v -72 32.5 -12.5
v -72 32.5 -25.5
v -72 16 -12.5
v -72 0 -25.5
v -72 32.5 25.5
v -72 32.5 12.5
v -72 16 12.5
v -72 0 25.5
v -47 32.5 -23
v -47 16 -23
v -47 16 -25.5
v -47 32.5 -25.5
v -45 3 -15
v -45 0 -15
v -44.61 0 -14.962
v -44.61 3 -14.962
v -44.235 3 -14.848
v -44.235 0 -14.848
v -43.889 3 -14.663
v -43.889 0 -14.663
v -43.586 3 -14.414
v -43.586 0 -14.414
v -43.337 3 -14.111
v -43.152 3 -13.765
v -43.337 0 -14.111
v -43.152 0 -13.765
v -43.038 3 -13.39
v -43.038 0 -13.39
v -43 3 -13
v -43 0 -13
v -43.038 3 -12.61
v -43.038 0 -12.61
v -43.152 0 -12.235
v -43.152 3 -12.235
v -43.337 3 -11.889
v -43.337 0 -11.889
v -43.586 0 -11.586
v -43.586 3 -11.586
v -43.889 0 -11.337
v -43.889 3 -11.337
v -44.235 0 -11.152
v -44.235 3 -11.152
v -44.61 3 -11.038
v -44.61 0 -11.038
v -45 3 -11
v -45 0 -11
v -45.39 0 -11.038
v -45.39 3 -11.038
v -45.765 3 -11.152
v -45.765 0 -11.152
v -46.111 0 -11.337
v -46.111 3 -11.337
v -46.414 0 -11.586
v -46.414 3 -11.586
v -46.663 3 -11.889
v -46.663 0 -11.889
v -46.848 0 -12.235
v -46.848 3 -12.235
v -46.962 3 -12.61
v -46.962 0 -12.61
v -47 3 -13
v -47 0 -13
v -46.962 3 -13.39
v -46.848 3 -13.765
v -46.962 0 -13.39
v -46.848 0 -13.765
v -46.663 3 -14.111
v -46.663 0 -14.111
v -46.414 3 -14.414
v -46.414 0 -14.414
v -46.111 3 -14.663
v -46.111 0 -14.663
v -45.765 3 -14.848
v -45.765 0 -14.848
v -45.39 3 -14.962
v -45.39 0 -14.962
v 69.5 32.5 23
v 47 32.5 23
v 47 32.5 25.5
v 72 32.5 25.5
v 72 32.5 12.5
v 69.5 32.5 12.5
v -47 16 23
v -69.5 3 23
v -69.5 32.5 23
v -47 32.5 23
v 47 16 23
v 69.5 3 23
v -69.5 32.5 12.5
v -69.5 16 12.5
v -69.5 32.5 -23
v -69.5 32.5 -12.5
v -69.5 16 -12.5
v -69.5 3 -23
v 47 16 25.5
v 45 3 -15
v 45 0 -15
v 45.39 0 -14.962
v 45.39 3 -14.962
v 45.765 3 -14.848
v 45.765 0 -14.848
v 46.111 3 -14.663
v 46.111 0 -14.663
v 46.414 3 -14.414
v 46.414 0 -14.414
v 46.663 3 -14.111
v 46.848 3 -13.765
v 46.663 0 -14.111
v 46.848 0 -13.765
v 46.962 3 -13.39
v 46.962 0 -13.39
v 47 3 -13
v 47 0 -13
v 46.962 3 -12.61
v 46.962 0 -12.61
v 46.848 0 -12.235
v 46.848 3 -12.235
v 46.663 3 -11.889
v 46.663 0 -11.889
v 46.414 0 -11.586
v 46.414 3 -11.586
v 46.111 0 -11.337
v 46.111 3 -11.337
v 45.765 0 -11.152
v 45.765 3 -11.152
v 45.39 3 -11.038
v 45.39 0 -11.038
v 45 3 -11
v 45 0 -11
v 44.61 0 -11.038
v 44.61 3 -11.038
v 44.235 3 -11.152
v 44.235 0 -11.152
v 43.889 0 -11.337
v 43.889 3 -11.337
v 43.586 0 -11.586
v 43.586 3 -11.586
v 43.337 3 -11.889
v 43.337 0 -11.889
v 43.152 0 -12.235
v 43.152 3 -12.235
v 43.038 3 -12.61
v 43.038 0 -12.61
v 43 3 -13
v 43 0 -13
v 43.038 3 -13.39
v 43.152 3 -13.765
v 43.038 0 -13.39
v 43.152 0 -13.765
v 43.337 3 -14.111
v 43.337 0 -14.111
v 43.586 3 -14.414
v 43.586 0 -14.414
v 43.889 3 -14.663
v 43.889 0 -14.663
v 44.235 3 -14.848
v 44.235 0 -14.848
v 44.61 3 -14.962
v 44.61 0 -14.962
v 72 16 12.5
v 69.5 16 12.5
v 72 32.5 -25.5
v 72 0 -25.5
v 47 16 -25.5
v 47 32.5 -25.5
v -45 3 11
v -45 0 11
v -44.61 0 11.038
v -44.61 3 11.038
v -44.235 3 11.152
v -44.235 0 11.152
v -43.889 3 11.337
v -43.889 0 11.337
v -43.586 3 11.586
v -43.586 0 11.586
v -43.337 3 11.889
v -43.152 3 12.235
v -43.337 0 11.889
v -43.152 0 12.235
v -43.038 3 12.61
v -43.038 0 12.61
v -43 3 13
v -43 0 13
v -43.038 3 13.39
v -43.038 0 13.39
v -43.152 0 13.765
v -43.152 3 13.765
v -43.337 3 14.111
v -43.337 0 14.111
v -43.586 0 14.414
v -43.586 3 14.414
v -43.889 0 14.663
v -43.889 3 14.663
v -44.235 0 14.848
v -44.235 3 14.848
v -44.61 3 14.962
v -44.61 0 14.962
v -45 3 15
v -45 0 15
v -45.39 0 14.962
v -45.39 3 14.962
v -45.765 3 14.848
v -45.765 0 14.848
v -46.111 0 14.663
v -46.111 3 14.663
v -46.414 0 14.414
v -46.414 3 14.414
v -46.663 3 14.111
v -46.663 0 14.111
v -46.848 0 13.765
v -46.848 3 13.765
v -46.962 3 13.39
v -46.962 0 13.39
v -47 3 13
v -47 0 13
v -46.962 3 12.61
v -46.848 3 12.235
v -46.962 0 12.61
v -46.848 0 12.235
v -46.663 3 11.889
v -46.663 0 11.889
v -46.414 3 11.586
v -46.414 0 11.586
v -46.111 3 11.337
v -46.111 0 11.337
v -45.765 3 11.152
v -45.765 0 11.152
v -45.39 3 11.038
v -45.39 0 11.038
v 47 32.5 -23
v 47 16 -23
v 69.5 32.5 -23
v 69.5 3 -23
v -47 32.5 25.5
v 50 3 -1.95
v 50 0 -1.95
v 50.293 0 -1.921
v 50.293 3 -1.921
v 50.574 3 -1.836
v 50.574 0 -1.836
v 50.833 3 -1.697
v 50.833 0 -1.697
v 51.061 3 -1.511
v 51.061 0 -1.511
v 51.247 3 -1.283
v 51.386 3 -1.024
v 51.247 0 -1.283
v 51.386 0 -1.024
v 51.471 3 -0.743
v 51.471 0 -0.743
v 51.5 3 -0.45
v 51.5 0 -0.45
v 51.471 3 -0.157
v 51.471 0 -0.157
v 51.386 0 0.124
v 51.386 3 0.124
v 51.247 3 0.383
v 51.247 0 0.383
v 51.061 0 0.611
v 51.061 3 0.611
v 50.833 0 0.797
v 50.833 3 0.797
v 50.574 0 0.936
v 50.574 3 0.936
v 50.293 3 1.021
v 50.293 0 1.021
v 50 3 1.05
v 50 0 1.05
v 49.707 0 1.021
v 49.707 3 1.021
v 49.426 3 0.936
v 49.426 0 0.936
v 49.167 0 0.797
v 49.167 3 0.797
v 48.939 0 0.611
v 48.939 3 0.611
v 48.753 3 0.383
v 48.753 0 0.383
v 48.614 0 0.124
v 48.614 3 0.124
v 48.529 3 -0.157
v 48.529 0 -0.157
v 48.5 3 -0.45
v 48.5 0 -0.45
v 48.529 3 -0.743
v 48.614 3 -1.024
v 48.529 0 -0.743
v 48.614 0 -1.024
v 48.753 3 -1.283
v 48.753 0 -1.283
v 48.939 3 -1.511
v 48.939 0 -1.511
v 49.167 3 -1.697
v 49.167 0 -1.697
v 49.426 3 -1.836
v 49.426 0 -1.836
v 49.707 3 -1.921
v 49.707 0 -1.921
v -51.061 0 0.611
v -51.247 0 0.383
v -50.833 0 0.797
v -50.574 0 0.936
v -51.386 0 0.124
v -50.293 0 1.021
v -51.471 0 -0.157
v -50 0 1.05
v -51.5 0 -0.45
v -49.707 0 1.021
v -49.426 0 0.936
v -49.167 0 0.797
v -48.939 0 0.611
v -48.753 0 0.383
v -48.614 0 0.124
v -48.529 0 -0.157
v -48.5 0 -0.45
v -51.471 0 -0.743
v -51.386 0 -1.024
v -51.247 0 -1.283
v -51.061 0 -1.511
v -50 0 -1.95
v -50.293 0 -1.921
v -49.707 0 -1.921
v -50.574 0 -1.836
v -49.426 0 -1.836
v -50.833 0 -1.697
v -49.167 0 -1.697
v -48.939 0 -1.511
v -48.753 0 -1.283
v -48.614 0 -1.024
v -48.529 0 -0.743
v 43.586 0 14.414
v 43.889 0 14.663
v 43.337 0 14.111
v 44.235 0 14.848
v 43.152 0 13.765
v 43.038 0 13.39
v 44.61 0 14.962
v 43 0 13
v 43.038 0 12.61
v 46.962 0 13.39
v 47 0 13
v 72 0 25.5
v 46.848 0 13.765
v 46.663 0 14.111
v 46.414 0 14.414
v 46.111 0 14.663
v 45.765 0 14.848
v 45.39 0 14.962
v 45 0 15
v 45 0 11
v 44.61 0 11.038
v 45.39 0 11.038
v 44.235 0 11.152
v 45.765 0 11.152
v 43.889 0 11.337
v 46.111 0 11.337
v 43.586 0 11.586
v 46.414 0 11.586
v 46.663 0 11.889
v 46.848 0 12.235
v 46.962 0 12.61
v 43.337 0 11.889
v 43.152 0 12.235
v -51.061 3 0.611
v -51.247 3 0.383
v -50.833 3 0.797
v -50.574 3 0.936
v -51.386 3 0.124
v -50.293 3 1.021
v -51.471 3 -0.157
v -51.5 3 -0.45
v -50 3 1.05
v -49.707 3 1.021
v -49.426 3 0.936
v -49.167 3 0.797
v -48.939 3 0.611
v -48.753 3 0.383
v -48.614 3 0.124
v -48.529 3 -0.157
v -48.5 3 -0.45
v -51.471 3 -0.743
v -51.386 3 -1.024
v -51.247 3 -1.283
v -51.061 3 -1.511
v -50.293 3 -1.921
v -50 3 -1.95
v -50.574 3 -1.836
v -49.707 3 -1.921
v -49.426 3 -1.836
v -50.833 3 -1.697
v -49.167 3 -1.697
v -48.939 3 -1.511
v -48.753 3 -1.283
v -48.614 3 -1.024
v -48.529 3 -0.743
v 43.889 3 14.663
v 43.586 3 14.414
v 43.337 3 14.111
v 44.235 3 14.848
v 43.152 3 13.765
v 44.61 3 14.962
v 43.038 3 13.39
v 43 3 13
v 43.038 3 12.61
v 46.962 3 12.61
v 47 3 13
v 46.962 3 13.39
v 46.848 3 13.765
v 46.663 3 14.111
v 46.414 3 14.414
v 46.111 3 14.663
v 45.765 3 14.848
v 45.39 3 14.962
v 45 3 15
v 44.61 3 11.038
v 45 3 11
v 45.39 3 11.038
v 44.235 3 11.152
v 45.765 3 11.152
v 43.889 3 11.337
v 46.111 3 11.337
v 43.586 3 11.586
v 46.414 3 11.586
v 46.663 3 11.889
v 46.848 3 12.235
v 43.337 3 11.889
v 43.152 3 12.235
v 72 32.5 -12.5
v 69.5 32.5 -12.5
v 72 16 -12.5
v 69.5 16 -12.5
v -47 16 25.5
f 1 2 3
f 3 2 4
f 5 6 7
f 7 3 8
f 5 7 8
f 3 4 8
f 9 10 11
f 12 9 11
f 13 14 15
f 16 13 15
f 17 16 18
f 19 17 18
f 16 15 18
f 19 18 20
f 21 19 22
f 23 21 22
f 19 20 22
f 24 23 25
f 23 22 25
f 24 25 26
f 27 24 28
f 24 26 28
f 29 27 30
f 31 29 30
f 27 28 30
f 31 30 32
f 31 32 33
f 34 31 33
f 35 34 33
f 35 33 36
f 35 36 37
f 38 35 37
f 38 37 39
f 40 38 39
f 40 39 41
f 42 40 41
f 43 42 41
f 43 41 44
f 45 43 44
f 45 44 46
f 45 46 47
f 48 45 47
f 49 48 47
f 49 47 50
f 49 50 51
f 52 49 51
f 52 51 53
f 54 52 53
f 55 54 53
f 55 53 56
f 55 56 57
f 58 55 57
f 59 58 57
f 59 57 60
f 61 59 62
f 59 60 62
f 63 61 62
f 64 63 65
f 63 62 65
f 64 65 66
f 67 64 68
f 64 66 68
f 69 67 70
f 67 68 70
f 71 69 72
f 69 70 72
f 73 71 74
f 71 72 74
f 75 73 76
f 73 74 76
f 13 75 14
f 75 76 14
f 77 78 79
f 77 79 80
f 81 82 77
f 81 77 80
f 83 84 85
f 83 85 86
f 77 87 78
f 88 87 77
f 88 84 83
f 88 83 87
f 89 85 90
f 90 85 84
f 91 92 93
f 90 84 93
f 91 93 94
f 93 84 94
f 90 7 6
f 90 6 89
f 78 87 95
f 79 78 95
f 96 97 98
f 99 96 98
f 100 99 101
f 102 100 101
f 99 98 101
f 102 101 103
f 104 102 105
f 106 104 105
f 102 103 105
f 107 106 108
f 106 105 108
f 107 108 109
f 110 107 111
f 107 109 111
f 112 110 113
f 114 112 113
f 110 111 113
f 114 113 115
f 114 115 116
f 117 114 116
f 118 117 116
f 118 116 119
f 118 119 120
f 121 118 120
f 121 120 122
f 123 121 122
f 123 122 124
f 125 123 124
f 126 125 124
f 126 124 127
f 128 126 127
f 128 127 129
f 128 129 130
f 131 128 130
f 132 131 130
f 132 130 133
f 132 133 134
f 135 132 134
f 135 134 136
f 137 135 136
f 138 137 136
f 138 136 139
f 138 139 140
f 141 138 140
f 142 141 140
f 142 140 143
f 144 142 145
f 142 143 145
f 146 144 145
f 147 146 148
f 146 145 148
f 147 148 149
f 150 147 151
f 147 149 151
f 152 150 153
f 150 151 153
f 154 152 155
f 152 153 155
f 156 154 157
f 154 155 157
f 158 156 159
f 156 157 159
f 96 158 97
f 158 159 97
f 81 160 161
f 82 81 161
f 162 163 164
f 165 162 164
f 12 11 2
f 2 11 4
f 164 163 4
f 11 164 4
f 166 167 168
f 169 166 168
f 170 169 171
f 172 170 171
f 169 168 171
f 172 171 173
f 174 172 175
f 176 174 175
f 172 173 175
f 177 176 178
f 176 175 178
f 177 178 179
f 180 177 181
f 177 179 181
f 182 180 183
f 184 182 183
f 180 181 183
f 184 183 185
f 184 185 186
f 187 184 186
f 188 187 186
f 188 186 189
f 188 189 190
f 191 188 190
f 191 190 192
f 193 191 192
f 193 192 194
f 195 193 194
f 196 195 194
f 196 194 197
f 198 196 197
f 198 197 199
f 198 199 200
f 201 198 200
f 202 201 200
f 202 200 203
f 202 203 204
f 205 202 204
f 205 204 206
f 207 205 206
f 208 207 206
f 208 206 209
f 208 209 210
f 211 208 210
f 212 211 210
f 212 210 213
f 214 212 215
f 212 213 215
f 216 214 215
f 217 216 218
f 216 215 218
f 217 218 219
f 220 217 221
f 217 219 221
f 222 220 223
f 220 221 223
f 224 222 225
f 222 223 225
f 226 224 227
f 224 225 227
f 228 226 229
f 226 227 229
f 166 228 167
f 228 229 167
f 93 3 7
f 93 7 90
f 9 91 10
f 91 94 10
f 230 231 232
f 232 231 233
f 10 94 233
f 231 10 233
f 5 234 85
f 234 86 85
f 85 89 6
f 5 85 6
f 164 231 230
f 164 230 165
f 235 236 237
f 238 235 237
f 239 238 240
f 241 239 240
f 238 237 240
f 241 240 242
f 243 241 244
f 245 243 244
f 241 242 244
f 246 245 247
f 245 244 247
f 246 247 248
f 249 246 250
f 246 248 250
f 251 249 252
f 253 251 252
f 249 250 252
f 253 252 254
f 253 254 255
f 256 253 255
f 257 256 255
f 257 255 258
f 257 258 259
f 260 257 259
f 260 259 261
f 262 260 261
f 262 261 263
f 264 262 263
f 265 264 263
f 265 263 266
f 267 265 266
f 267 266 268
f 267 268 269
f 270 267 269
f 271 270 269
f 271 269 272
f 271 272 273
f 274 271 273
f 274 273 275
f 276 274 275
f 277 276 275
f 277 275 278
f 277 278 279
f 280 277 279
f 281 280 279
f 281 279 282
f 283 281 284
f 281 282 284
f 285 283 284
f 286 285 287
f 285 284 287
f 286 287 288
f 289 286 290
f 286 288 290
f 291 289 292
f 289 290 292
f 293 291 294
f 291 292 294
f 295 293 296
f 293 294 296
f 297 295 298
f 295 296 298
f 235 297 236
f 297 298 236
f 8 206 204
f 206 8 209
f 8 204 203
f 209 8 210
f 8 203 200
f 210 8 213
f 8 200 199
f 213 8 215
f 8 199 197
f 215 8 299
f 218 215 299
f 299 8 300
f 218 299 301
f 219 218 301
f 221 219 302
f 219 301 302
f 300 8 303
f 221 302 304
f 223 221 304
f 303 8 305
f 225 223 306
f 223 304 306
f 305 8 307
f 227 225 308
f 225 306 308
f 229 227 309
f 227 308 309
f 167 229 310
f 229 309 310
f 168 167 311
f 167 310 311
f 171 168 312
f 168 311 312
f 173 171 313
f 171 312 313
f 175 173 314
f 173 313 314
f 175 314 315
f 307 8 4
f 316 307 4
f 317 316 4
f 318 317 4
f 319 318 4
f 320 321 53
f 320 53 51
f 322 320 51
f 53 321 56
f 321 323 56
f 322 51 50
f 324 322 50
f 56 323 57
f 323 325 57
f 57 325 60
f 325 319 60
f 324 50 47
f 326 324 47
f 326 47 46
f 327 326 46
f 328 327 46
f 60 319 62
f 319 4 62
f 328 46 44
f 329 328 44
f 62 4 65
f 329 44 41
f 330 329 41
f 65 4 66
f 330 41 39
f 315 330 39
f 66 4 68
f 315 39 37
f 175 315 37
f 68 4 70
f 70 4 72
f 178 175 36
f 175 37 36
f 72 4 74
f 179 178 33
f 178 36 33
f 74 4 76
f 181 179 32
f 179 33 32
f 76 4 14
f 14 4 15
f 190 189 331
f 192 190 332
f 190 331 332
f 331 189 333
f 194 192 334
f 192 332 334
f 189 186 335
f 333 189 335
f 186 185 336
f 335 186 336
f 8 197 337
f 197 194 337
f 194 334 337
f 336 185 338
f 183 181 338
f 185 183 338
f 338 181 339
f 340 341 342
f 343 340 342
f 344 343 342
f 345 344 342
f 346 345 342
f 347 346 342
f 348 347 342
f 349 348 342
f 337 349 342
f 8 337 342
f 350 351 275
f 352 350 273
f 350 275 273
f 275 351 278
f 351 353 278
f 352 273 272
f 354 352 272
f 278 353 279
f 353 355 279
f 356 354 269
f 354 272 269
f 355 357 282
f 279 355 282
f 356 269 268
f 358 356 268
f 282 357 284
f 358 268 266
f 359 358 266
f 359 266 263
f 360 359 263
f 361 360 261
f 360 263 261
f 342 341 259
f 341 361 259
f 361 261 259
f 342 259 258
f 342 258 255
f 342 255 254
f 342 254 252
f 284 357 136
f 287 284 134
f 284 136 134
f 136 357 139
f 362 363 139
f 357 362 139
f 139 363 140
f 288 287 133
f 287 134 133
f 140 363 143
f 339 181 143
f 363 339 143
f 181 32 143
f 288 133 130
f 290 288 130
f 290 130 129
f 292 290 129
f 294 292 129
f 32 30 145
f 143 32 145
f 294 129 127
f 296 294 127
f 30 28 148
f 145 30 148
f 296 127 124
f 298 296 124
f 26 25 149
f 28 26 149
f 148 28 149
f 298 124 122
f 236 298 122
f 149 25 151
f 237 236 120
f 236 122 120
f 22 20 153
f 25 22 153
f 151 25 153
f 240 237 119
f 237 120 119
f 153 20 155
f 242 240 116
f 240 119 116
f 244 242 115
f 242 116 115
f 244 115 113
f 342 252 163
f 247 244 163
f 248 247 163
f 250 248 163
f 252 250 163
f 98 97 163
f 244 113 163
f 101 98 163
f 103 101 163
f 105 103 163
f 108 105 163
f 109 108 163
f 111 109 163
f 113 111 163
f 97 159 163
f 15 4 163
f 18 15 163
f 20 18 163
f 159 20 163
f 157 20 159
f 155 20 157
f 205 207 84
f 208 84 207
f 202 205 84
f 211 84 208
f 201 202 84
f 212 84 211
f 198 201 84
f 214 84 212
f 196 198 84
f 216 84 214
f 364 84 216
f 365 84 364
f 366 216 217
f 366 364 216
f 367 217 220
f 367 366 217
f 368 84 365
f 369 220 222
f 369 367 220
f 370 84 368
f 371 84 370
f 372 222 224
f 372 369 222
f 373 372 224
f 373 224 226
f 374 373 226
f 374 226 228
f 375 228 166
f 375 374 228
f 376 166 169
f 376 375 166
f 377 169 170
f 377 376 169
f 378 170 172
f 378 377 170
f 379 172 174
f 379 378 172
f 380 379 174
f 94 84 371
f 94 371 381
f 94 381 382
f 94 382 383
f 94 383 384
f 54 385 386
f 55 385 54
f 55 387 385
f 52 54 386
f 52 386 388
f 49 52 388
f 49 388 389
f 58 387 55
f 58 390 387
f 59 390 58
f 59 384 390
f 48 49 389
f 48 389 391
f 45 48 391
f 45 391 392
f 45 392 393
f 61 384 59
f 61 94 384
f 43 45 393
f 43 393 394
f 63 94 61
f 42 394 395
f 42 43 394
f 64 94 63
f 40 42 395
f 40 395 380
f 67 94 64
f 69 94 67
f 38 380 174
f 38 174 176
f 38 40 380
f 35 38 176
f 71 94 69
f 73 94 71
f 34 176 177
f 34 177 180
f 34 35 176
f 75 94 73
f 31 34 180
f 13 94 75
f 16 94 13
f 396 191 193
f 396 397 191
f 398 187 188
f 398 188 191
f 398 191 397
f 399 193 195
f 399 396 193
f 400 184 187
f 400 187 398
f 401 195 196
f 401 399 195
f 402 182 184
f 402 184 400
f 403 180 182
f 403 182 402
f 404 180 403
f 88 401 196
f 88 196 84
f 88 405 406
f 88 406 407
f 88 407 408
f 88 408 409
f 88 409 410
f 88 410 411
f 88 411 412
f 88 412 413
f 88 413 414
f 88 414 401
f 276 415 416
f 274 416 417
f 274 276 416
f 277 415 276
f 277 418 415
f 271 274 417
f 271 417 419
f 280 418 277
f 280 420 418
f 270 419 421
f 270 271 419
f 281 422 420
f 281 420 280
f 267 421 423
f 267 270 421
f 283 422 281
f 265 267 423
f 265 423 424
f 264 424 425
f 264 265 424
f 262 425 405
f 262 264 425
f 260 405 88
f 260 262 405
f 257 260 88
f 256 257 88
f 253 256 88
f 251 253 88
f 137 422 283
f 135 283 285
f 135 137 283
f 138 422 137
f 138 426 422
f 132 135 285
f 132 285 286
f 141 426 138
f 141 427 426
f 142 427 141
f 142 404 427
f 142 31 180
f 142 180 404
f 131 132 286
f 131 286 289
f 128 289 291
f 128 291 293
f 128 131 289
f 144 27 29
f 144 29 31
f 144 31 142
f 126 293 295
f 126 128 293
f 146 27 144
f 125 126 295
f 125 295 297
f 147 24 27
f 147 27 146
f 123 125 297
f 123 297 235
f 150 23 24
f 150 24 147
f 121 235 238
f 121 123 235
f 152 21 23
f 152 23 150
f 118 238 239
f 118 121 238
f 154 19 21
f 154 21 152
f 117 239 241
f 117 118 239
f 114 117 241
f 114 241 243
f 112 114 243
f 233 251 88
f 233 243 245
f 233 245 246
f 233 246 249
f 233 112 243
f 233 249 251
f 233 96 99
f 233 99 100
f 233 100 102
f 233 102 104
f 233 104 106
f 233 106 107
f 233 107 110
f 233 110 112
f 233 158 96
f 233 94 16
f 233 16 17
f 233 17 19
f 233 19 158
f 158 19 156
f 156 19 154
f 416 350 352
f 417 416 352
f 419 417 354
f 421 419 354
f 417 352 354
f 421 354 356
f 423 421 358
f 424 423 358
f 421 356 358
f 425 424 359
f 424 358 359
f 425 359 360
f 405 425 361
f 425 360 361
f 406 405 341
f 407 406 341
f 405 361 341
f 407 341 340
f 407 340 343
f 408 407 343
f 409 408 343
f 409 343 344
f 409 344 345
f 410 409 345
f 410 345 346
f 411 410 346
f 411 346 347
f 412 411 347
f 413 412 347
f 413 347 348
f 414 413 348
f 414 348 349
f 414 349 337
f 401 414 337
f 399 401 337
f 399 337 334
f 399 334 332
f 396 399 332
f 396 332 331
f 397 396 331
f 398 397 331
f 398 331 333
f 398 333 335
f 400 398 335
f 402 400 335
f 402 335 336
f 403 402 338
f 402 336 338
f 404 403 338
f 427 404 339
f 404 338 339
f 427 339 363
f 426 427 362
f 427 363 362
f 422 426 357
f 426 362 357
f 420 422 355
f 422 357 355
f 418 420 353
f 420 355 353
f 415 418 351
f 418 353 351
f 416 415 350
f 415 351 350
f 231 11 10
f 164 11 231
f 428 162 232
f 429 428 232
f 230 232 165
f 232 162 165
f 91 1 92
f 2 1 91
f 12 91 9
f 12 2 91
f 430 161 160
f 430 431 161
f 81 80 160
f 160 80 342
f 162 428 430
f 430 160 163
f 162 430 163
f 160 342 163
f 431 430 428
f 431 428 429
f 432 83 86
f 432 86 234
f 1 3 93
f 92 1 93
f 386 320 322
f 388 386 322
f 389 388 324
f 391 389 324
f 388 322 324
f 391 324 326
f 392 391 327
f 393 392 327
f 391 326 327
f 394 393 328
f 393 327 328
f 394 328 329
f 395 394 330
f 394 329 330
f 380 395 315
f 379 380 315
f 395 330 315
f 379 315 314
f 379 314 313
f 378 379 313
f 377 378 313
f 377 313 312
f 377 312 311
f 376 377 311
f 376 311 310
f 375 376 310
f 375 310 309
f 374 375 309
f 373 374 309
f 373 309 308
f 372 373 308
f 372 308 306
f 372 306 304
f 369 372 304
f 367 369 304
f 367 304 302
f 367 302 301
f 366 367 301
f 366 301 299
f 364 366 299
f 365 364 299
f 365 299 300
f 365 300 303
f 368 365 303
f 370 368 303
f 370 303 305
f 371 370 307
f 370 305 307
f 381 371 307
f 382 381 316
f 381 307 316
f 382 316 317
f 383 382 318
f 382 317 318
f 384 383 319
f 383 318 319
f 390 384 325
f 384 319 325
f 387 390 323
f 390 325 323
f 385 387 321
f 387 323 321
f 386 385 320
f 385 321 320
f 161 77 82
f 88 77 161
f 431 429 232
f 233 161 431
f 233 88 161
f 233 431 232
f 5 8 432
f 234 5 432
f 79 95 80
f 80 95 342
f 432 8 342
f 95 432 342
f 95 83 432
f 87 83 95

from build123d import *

# Parameters (mm, degrees)
SKETCH1_W           = 144
SKETCH1_H           = 51
BOSS_EXTRUDE1_DEPTH = 3
BOSS_EXTRUDE2_START = -3
SKETCH2_W           = 144
SKETCH2_H           = 51
SKETCH2_W_2         = 139
SKETCH2_H_2         = 46
BOSS_EXTRUDE2_DEPTH = 16
BOSS_EXTRUDE3_DEPTH = 16.5
SKETCH4_R           = 2
SKETCH4_R_2         = 1.5
CUT_EXTRUDE1_DEPTH  = 84.009035653


with BuildPart() as part:
    # Sketch1 → Boss-Extrude1 (new body)
    with BuildSketch(Plane(origin=(0, 0, 0), x_dir=(1, 0, 0), z_dir=(0, 1, 0))):
        Rectangle(SKETCH1_W, SKETCH1_H)
    extrude(amount=BOSS_EXTRUDE1_DEPTH)

    # Sketch2 → Boss-Extrude2 (add)
    with BuildSketch(Plane(origin=(0, 3, 0), x_dir=(1, 0, 0), z_dir=(0, 1, 0)).offset(BOSS_EXTRUDE2_START)):
        Rectangle(SKETCH2_W, SKETCH2_H)
        Rectangle(SKETCH2_W_2, SKETCH2_H_2, mode=Mode.SUBTRACT)
    extrude(amount=BOSS_EXTRUDE2_DEPTH)

    # Sketch3 → Boss-Extrude3 (add)
    with BuildSketch(Plane(origin=(0, 16, 0), x_dir=(1, 0, 0), z_dir=(0, 1, 0))):
        Polygon((-72, 25.5), (-72, 12.5), (-69.5, 12.5), (-69.5, 23), (-47, 23), (-47, 25.5), align=None)
        Polygon((47, 25.5), (72, 25.5), (72, 12.5), (69.5, 12.5), (69.5, 23), (47, 23), align=None)
        Polygon((72, -25.5), (72, -12.5), (69.5, -12.5), (69.5, -23), (47, -23), (47, -25.5), align=None)
        Polygon((-47, -25.5), (-72, -25.5), (-72, -12.5), (-69.5, -12.5), (-69.5, -23), (-47, -23), align=None)
    extrude(amount=BOSS_EXTRUDE3_DEPTH)

    # Sketch4 → Cut-Extrude1 (cut, through all)
    with BuildSketch(Plane.XZ):
        with Locations(Location((-45, -13, 0), (0, 0, 270))):
            Circle(SKETCH4_R)
        with Locations(Location((-45, 13, 0), (0, 0, 270))):
            Circle(SKETCH4_R)
        with Locations(Location((45, 13, 0), (0, 0, 270))):
            Circle(SKETCH4_R)
        with Locations(Location((45, -13, 0), (0, 0, 270))):
            Circle(SKETCH4_R)
        with Locations(Location((-50, -0.45, 0), (0, 0, 270))):
            Circle(SKETCH4_R_2)
        with Locations(Location((50, -0.45, 0), (0, 0, 270))):
            Circle(SKETCH4_R_2)
    extrude(amount=-CUT_EXTRUDE1_DEPTH, mode=Mode.SUBTRACT)


solid = part.part
